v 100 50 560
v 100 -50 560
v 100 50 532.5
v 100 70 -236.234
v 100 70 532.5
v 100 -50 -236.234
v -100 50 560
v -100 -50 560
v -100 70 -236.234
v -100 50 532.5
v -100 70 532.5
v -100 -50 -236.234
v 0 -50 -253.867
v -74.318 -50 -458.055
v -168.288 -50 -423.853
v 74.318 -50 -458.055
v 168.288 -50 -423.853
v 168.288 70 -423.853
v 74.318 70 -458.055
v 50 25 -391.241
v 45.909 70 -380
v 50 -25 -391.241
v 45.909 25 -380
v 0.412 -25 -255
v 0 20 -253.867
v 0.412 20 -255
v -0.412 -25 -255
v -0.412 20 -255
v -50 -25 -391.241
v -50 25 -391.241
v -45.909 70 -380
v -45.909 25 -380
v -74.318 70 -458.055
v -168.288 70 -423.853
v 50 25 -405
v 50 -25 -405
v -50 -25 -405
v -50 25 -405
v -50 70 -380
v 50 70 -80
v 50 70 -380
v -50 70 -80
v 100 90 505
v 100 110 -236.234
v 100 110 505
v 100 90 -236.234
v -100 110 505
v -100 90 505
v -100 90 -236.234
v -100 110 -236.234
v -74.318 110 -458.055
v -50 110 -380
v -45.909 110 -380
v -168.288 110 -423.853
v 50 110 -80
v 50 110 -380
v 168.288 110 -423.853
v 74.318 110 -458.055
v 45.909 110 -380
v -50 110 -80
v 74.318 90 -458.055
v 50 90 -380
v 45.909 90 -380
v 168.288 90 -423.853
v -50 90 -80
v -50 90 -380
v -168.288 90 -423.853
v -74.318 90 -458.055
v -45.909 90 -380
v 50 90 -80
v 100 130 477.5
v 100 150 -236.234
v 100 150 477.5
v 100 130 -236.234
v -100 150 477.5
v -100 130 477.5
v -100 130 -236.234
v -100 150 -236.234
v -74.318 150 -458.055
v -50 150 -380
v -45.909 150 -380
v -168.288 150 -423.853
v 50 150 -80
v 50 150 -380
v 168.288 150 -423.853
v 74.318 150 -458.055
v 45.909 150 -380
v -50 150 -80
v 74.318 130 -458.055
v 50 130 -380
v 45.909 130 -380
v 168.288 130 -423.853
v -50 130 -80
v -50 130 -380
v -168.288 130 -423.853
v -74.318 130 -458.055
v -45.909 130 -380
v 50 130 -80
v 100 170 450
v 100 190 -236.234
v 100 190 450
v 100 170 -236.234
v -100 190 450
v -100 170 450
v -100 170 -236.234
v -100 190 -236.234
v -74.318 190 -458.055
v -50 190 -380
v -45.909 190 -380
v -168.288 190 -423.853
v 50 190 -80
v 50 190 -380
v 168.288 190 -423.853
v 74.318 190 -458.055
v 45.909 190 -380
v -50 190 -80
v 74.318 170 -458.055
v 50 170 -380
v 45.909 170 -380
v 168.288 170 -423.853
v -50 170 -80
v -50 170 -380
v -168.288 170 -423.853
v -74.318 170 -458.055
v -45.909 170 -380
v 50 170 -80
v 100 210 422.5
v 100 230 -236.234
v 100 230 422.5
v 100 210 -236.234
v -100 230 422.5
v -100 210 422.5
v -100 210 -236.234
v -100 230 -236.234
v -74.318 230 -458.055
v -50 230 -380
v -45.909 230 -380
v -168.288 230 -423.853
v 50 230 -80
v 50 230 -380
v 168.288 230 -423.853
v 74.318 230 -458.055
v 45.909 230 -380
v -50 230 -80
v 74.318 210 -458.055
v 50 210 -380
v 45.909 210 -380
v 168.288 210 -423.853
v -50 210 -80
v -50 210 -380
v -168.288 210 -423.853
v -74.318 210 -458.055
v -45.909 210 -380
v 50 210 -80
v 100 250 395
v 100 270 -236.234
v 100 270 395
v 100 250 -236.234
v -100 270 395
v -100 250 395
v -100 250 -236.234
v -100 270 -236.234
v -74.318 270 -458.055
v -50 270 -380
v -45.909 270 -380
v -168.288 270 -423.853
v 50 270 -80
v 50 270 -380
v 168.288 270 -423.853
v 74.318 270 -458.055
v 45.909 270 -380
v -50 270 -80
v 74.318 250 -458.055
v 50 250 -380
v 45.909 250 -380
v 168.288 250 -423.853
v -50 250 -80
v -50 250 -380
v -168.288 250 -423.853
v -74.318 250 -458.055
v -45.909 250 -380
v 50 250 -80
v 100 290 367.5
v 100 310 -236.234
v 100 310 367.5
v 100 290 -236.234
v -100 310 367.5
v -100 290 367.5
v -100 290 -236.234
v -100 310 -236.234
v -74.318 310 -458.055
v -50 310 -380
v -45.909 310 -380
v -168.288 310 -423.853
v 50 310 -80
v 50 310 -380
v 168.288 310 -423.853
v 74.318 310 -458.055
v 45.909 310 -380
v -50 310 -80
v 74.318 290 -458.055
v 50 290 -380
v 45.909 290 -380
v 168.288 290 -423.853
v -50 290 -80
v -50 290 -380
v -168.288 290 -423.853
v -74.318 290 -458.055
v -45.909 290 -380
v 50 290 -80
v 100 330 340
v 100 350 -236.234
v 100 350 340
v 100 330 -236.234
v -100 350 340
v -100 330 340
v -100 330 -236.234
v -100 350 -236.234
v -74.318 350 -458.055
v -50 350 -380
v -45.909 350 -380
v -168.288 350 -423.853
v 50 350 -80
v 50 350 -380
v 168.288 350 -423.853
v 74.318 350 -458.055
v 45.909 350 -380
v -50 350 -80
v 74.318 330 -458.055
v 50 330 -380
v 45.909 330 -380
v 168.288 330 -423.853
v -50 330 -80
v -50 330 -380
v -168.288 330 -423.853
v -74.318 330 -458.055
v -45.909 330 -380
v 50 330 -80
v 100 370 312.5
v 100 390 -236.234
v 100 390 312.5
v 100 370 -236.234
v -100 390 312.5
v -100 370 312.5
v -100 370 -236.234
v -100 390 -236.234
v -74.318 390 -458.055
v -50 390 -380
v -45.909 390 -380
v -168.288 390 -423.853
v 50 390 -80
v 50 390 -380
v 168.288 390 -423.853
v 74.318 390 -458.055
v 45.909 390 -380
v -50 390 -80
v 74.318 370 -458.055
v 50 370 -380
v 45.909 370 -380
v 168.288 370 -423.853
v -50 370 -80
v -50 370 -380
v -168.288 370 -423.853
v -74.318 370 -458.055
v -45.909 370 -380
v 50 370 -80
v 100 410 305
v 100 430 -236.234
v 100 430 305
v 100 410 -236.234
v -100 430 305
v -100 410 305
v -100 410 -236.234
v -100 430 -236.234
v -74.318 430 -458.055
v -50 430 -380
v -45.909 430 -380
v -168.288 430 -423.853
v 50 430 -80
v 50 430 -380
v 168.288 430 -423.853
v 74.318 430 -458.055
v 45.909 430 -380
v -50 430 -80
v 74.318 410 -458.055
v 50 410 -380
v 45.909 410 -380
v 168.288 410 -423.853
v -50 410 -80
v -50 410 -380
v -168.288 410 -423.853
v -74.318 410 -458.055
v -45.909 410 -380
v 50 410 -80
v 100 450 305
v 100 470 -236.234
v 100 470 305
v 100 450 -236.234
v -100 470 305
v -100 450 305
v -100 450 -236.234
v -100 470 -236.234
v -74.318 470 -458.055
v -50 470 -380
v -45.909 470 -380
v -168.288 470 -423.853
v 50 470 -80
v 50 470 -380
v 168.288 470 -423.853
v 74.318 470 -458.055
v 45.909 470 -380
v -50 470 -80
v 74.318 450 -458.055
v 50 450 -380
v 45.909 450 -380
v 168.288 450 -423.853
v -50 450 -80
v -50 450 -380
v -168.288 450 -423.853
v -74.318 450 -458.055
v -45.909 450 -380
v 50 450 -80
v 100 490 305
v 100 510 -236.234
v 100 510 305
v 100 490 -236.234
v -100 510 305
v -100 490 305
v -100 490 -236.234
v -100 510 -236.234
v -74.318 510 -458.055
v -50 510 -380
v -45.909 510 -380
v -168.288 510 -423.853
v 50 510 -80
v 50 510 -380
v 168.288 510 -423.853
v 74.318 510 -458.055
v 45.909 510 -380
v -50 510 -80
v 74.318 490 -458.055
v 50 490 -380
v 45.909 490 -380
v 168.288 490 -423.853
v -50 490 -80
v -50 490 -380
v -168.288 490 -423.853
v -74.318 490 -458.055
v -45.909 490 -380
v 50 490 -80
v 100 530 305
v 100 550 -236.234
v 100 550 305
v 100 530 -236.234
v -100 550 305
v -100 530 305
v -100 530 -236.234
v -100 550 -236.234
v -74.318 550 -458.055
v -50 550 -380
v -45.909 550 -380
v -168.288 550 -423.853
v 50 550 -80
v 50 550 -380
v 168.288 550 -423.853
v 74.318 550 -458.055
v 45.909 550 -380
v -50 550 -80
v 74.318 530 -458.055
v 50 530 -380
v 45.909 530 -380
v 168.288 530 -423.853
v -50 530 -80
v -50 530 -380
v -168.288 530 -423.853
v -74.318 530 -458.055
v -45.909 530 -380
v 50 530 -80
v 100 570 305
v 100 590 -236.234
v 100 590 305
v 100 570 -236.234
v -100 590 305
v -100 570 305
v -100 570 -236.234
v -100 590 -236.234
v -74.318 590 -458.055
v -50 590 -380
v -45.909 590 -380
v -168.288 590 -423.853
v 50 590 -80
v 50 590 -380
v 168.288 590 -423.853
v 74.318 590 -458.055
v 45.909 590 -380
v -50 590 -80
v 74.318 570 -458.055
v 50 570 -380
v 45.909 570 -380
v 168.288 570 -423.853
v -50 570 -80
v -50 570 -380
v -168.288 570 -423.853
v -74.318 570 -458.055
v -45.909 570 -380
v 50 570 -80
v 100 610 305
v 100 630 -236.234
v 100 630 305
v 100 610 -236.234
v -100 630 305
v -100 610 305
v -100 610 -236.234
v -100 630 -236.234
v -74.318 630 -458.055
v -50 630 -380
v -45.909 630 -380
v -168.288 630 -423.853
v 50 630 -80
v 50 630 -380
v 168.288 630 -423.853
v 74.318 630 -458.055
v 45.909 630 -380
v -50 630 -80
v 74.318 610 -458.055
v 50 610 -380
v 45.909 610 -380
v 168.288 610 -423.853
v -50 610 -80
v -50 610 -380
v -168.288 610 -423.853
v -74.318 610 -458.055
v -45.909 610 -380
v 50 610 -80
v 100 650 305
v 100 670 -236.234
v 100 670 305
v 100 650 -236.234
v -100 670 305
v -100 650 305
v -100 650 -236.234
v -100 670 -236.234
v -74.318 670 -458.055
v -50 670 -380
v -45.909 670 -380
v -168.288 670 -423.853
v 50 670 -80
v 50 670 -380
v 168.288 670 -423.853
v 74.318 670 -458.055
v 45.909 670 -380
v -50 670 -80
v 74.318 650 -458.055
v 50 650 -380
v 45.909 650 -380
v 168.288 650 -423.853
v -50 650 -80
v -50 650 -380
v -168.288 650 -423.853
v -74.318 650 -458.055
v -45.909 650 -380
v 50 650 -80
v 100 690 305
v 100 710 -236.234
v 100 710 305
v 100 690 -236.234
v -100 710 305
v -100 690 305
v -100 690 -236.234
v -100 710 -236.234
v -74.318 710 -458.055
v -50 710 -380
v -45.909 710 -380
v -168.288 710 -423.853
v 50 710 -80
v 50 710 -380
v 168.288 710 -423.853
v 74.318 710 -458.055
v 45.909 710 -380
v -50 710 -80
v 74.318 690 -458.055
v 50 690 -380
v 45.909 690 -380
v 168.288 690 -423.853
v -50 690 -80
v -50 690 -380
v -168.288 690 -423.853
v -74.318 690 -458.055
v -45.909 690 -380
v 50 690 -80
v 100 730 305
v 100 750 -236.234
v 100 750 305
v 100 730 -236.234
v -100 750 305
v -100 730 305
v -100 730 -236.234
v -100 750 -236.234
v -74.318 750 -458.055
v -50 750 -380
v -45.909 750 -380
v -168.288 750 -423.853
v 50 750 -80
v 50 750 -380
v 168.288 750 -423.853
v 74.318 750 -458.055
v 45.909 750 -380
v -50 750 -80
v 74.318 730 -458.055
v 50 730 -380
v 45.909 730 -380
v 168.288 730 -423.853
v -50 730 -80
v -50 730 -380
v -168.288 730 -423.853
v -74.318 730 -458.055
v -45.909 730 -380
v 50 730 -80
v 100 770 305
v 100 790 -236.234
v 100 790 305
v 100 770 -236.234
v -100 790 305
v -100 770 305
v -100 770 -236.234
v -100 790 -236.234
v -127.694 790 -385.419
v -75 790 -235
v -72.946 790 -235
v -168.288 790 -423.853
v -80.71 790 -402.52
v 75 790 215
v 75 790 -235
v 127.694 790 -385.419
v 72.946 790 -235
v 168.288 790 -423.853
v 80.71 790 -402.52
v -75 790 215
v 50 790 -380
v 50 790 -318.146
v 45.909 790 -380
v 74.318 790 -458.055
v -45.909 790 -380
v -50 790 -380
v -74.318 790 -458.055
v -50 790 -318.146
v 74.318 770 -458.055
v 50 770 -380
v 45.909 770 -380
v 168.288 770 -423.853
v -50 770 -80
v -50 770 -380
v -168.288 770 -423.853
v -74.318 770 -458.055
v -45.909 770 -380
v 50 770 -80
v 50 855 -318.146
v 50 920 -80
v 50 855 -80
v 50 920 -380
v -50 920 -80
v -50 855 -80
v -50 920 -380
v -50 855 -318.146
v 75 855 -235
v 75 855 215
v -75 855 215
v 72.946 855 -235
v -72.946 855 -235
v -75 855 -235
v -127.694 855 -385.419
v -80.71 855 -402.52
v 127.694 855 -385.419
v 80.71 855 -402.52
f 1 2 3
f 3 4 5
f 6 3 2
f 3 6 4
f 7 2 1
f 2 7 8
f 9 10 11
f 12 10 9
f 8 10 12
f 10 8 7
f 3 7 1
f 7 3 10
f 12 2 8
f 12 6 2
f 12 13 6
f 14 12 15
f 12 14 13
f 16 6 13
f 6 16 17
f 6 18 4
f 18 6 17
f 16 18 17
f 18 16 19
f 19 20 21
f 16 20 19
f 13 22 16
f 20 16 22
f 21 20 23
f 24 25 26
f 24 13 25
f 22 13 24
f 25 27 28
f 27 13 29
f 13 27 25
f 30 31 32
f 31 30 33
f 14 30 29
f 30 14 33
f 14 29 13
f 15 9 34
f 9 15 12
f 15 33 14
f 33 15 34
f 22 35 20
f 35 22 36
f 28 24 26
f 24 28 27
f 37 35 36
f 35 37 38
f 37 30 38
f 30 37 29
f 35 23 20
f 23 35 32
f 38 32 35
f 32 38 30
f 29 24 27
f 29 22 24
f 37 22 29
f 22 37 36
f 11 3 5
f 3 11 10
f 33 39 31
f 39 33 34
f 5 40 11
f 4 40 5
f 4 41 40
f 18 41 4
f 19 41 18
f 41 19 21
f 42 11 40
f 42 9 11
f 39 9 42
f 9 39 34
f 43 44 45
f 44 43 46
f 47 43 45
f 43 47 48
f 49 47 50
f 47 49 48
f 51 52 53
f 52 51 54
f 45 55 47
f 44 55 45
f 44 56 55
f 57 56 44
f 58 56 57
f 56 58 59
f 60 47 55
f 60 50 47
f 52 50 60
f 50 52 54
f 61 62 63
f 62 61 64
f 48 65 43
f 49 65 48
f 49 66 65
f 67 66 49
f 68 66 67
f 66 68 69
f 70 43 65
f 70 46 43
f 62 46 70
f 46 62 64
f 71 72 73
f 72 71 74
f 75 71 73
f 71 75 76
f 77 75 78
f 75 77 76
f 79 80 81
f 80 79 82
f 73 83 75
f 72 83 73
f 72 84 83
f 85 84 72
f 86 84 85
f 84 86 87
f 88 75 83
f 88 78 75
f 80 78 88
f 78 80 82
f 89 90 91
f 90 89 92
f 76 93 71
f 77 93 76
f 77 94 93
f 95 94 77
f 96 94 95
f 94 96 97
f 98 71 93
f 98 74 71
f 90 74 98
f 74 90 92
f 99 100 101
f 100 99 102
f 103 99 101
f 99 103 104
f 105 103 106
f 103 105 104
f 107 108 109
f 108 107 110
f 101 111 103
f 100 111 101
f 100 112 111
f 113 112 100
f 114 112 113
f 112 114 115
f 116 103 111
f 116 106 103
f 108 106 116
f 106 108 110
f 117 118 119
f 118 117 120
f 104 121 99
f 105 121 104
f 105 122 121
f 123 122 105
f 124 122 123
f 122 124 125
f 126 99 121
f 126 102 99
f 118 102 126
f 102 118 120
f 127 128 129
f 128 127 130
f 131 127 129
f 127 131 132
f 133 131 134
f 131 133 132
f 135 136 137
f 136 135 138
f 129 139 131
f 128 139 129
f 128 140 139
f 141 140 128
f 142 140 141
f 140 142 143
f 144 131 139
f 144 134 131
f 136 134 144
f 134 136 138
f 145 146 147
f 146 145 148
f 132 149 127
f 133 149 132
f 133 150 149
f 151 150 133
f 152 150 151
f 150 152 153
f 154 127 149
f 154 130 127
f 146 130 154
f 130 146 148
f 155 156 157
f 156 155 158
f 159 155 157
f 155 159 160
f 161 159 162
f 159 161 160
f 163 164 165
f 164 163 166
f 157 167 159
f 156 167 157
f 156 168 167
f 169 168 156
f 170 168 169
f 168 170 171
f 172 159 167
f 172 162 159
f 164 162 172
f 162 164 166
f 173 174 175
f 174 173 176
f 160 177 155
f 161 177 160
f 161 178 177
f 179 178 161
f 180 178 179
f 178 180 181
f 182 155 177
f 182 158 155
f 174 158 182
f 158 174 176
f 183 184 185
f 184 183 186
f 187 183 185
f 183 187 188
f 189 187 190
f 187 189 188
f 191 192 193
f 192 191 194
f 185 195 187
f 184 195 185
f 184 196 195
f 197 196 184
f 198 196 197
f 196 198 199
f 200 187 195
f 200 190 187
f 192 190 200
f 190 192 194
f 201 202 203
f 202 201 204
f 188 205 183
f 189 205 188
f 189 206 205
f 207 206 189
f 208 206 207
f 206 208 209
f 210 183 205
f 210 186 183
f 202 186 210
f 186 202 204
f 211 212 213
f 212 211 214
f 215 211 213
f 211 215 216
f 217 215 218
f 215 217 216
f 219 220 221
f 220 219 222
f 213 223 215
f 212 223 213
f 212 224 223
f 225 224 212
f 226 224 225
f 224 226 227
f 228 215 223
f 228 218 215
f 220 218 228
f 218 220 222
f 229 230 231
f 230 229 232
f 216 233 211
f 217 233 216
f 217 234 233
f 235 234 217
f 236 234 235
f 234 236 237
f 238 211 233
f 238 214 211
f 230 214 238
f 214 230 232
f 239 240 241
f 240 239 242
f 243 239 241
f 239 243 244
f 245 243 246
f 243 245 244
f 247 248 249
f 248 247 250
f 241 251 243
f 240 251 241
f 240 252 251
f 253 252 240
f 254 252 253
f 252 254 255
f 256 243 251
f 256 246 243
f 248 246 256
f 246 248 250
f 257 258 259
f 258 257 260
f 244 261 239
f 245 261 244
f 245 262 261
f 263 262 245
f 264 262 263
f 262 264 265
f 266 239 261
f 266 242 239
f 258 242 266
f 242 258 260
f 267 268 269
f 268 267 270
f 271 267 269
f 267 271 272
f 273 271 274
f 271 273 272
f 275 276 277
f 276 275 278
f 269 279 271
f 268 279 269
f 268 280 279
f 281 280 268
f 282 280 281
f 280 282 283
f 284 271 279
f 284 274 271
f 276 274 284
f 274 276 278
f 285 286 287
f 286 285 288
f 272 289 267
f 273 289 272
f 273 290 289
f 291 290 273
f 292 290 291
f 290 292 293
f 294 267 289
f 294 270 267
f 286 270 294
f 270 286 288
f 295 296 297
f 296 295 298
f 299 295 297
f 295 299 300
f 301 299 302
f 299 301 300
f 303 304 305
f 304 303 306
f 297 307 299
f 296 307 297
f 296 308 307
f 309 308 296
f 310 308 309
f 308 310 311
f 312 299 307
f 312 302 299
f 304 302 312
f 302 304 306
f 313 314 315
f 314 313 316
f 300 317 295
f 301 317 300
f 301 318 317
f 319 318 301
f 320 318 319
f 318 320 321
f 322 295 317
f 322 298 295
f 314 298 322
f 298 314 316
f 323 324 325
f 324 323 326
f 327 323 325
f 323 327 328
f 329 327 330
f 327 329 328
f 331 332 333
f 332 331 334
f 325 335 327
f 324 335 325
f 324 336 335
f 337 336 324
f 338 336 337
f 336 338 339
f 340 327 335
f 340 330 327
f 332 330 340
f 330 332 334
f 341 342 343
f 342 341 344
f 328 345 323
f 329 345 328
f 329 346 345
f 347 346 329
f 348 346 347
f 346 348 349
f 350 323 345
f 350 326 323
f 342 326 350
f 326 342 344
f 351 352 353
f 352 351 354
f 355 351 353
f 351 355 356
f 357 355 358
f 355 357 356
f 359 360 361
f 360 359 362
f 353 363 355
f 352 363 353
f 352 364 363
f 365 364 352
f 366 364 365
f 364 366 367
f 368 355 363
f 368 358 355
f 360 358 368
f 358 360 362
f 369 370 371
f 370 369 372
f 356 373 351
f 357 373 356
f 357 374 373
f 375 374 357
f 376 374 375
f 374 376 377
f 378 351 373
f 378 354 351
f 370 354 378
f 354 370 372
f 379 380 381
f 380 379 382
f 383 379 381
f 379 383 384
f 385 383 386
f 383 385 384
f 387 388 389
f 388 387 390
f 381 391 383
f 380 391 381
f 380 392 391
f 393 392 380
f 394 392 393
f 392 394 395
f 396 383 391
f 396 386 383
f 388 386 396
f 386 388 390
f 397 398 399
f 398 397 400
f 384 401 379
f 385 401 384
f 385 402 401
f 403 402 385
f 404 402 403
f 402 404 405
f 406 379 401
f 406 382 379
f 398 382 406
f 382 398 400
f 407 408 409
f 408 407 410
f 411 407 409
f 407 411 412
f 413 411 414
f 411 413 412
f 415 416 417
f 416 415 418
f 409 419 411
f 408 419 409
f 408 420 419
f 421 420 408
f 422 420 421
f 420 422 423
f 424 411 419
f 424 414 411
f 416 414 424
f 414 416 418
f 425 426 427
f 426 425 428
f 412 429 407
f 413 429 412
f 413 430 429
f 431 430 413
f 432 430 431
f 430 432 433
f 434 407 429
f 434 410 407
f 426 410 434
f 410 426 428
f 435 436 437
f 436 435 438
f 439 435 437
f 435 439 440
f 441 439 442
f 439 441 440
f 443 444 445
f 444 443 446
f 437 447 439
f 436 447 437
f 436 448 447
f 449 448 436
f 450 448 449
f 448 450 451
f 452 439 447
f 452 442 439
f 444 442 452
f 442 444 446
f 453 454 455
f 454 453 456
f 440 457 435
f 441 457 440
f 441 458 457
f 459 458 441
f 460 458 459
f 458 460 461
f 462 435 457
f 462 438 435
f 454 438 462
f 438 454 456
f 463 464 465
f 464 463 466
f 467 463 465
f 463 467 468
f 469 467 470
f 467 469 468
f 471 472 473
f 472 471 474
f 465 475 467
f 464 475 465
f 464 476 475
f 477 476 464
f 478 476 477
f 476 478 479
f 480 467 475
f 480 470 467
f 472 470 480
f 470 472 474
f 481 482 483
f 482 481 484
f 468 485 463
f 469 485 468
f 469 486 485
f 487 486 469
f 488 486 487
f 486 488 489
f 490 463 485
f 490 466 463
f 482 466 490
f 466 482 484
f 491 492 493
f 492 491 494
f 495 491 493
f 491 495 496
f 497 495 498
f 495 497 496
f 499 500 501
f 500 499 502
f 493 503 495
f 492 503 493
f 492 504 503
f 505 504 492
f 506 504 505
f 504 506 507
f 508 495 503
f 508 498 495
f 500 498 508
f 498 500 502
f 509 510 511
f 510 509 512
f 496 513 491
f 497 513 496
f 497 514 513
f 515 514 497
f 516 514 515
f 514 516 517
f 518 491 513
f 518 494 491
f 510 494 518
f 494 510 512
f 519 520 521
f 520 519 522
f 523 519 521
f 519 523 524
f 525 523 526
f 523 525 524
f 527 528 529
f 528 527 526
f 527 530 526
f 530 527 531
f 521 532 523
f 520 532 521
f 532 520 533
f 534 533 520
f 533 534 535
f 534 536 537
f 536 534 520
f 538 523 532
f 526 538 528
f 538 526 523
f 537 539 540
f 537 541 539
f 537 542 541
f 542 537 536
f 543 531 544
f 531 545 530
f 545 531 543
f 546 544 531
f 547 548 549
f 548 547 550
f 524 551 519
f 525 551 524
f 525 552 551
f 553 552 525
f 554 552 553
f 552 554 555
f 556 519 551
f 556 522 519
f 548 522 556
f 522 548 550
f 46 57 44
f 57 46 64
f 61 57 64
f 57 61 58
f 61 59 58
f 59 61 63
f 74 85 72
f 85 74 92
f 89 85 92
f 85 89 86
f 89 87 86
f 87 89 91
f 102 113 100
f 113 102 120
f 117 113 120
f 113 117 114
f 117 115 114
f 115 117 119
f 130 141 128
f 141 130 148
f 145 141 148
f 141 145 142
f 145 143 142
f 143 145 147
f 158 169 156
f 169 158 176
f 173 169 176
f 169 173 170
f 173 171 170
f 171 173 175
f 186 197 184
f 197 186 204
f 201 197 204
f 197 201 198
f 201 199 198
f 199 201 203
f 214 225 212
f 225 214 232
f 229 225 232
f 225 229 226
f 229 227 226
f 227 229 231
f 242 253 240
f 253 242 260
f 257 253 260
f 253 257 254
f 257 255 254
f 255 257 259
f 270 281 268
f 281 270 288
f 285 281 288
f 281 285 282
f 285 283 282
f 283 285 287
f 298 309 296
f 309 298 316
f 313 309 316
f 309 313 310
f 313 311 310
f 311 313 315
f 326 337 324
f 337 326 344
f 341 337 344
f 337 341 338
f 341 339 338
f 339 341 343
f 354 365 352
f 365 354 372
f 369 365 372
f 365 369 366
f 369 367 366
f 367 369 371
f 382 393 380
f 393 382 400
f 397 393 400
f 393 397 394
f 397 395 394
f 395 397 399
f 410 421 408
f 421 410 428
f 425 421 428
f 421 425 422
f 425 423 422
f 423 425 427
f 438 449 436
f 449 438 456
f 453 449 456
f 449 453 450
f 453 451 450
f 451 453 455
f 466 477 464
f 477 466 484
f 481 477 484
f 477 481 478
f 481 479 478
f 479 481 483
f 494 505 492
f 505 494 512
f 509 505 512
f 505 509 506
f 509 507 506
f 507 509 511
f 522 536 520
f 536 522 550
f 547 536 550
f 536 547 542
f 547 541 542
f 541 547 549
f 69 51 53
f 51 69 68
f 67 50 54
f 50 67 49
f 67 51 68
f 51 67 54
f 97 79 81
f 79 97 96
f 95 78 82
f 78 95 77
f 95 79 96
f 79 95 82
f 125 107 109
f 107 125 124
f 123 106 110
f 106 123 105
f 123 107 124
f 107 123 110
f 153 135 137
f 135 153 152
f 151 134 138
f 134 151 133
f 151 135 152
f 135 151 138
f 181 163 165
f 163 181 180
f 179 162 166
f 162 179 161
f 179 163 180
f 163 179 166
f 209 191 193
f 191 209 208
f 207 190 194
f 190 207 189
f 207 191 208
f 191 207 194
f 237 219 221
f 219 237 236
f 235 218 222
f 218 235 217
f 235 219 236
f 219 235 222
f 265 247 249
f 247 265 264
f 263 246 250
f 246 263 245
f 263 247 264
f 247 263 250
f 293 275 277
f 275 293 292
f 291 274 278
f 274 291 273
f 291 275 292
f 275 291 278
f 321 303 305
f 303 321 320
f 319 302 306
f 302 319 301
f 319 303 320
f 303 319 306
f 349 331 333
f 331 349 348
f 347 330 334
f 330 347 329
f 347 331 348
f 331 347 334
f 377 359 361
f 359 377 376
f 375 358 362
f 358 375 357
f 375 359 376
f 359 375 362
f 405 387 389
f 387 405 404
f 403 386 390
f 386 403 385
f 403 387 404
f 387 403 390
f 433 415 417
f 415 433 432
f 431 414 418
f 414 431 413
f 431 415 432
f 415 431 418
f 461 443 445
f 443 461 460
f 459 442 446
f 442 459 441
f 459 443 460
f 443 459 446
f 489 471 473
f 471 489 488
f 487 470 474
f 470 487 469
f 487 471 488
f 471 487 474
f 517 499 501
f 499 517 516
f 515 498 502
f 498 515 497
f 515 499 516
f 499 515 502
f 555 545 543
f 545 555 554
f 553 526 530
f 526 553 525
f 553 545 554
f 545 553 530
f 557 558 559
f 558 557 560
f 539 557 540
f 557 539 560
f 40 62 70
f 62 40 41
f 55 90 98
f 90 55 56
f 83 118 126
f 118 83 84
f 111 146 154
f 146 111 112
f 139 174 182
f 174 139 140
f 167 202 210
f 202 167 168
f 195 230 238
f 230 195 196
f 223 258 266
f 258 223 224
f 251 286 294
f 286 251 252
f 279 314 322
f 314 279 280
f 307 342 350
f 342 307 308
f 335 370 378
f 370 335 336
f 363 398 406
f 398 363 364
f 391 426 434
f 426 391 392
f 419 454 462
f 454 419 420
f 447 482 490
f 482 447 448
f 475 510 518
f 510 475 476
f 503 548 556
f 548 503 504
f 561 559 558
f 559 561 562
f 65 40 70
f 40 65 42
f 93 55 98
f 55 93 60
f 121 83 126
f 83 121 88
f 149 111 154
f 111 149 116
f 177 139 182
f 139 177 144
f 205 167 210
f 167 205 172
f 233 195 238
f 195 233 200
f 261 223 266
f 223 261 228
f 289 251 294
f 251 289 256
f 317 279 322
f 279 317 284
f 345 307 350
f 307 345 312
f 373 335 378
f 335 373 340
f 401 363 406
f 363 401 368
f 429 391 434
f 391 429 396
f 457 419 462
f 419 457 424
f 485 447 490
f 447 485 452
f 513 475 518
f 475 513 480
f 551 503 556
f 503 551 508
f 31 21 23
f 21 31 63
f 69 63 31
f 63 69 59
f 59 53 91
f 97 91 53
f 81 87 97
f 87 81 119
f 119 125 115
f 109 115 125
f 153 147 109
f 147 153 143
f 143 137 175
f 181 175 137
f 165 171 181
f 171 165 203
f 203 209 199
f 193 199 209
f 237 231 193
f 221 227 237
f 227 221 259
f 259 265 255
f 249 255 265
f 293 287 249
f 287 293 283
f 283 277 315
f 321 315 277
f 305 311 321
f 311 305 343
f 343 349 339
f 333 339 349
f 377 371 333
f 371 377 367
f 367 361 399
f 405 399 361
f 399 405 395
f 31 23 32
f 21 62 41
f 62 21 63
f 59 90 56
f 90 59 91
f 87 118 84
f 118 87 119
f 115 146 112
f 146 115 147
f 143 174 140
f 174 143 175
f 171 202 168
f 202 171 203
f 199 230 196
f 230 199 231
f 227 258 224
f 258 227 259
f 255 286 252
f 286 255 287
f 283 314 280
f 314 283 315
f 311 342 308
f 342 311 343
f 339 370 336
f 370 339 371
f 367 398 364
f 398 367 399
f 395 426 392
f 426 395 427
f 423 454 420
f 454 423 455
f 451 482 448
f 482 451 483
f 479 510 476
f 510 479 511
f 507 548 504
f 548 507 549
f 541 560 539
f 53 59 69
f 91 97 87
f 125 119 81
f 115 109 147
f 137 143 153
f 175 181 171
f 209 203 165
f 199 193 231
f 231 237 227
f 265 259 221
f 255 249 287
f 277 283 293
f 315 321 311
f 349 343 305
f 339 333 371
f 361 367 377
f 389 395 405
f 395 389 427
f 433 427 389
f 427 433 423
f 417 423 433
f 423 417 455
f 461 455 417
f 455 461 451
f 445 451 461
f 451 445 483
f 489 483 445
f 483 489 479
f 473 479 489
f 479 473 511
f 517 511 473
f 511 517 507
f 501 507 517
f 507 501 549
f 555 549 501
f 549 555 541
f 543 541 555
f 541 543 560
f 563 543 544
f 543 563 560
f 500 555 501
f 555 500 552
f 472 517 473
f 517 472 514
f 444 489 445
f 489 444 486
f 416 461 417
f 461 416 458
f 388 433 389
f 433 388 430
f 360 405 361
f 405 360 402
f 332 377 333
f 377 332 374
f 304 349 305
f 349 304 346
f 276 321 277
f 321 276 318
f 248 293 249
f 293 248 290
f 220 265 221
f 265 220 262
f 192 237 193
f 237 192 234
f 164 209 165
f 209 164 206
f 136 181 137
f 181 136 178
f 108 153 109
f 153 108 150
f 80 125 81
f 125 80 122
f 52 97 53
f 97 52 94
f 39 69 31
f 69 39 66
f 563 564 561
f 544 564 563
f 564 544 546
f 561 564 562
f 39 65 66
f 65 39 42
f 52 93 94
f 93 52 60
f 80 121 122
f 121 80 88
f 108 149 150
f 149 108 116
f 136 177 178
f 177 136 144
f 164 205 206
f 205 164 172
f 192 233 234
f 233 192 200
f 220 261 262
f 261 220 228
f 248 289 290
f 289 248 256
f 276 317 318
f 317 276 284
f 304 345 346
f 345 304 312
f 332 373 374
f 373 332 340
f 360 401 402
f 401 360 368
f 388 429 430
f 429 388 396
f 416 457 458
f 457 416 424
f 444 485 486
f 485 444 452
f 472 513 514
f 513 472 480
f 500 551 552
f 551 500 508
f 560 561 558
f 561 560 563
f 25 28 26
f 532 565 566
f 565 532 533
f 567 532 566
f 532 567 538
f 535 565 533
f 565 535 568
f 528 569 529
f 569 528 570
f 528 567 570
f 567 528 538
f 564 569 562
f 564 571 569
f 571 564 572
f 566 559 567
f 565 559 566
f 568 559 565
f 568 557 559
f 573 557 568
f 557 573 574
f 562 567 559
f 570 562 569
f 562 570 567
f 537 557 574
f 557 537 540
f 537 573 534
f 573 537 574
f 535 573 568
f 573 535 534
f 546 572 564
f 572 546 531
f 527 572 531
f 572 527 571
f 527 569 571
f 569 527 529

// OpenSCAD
$fs=0.25;$fa=6;
union() {
union() {
translate([0,0,160])cube([200,100,800],center=true);
translate([70,0,-300])rotate([0,-20,0])cube([100,100,300],center=true);
translate([-70,0,-300])rotate([0,20,0])cube([100,100,300],center=true);
translate([0,0,-330])cube([100,50,150],center=true);
}
union() {
translate([0,20,160])cube([200,20,800],center=true);
translate([0,60,140])cube([200,20,785],center=true);
translate([0,100,120])cube([200,20,770],center=true);
translate([0,140,100])cube([200,20,755],center=true);
translate([0,180,80])cube([200,20,740],center=true);
translate([0,220,60])cube([200,20,725],center=true);
translate([0,260,40])cube([200,20,710],center=true);
translate([0,300,20])cube([200,20,695],center=true);
translate([0,340,0])cube([200,20,680],center=true);
translate([0,380,-20])cube([200,20,665],center=true);
}
union() {
translate([0,420,-20])cube([200,20,650],center=true);
translate([0,460,-20])cube([200,20,650],center=true);
translate([0,500,-20])cube([200,20,650],center=true);
translate([0,540,-20])cube([200,20,650],center=true);
translate([0,580,-20])cube([200,20,650],center=true);
translate([0,620,-20])cube([200,20,650],center=true);
translate([0,660,-20])cube([200,20,650],center=true);
translate([0,700,-20])cube([200,20,650],center=true);
translate([0,740,-20])cube([200,20,650],center=true);
translate([0,780,-20])cube([200,20,650],center=true);
}
union() {
translate([70,20,-300])rotate([0,-20,0])cube([100,20,300],center=true);
translate([70,60,-300])rotate([0,-20,0])cube([100,20,300],center=true);
translate([70,100,-300])rotate([0,-20,0])cube([100,20,300],center=true);
translate([70,140,-300])rotate([0,-20,0])cube([100,20,300],center=true);
translate([70,180,-300])rotate([0,-20,0])cube([100,20,300],center=true);
translate([70,220,-300])rotate([0,-20,0])cube([100,20,300],center=true);
translate([70,260,-300])rotate([0,-20,0])cube([100,20,300],center=true);
translate([70,300,-300])rotate([0,-20,0])cube([100,20,300],center=true);
translate([70,340,-300])rotate([0,-20,0])cube([100,20,300],center=true);
translate([70,380,-300])rotate([0,-20,0])cube([100,20,300],center=true);
translate([70,420,-300])rotate([0,-20,0])cube([100,20,300],center=true);
translate([70,460,-300])rotate([0,-20,0])cube([100,20,300],center=true);
translate([70,500,-300])rotate([0,-20,0])cube([100,20,300],center=true);
translate([70,540,-300])rotate([0,-20,0])cube([100,20,300],center=true);
translate([70,580,-300])rotate([0,-20,0])cube([100,20,300],center=true);
translate([70,620,-300])rotate([0,-20,0])cube([100,20,300],center=true);
translate([70,660,-300])rotate([0,-20,0])cube([100,20,300],center=true);
translate([70,700,-300])rotate([0,-20,0])cube([100,20,300],center=true);
translate([70,740,-300])rotate([0,-20,0])cube([100,20,300],center=true);
translate([70,780,-300])rotate([0,-20,0])cube([100,20,300],center=true);
}
union() {
translate([-70,20,-300])rotate([0,20,0])cube([100,20,300],center=true);
translate([-70,60,-300])rotate([0,20,0])cube([100,20,300],center=true);
translate([-70,100,-300])rotate([0,20,0])cube([100,20,300],center=true);
translate([-70,140,-300])rotate([0,20,0])cube([100,20,300],center=true);
translate([-70,180,-300])rotate([0,20,0])cube([100,20,300],center=true);
translate([-70,220,-300])rotate([0,20,0])cube([100,20,300],center=true);
translate([-70,260,-300])rotate([0,20,0])cube([100,20,300],center=true);
translate([-70,300,-300])rotate([0,20,0])cube([100,20,300],center=true);
translate([-70,340,-300])rotate([0,20,0])cube([100,20,300],center=true);
translate([-70,380,-300])rotate([0,20,0])cube([100,20,300],center=true);
translate([-70,420,-300])rotate([0,20,0])cube([100,20,300],center=true);
translate([-70,460,-300])rotate([0,20,0])cube([100,20,300],center=true);
translate([-70,500,-300])rotate([0,20,0])cube([100,20,300],center=true);
translate([-70,540,-300])rotate([0,20,0])cube([100,20,300],center=true);
translate([-70,580,-300])rotate([0,20,0])cube([100,20,300],center=true);
translate([-70,620,-300])rotate([0,20,0])cube([100,20,300],center=true);
translate([-70,660,-300])rotate([0,20,0])cube([100,20,300],center=true);
translate([-70,700,-300])rotate([0,20,0])cube([100,20,300],center=true);
translate([-70,740,-300])rotate([0,20,0])cube([100,20,300],center=true);
translate([-70,780,-300])rotate([0,20,0])cube([100,20,300],center=true);
}
union() {
union() {
translate([-70,20,-300])rotate([0,20,0])cube([100,20,300],center=true);
translate([-70,60,-300])rotate([0,20,0])cube([100,20,300],center=true);
translate([-70,100,-300])rotate([0,20,0])cube([100,20,300],center=true);
translate([-70,140,-300])rotate([0,20,0])cube([100,20,300],center=true);
translate([-70,180,-300])rotate([0,20,0])cube([100,20,300],center=true);
translate([-70,220,-300])rotate([0,20,0])cube([100,20,300],center=true);
translate([-70,260,-300])rotate([0,20,0])cube([100,20,300],center=true);
translate([-70,300,-300])rotate([0,20,0])cube([100,20,300],center=true);
translate([-70,340,-300])rotate([0,20,0])cube([100,20,300],center=true);
translate([-70,380,-300])rotate([0,20,0])cube([100,20,300],center=true);
translate([-70,420,-300])rotate([0,20,0])cube([100,20,300],center=true);
translate([-70,460,-300])rotate([0,20,0])cube([100,20,300],center=true);
translate([-70,500,-300])rotate([0,20,0])cube([100,20,300],center=true);
translate([-70,540,-300])rotate([0,20,0])cube([100,20,300],center=true);
translate([-70,580,-300])rotate([0,20,0])cube([100,20,300],center=true);
translate([-70,620,-300])rotate([0,20,0])cube([100,20,300],center=true);
translate([-70,660,-300])rotate([0,20,0])cube([100,20,300],center=true);
translate([-70,700,-300])rotate([0,20,0])cube([100,20,300],center=true);
translate([-70,740,-300])rotate([0,20,0])cube([100,20,300],center=true);
translate([-70,780,-300])rotate([0,20,0])cube([100,20,300],center=true);
}
translate([0,470,-230])cube([100,900,300],center=true);
translate([0,820,-10])cube([150,70,450],center=true);
translate([70,820,-300])rotate([0,-20,0])cube([50,70,200],center=true);
translate([-70,820,-300])rotate([0,20,0])cube([50,70,200],center=true);
}
}
